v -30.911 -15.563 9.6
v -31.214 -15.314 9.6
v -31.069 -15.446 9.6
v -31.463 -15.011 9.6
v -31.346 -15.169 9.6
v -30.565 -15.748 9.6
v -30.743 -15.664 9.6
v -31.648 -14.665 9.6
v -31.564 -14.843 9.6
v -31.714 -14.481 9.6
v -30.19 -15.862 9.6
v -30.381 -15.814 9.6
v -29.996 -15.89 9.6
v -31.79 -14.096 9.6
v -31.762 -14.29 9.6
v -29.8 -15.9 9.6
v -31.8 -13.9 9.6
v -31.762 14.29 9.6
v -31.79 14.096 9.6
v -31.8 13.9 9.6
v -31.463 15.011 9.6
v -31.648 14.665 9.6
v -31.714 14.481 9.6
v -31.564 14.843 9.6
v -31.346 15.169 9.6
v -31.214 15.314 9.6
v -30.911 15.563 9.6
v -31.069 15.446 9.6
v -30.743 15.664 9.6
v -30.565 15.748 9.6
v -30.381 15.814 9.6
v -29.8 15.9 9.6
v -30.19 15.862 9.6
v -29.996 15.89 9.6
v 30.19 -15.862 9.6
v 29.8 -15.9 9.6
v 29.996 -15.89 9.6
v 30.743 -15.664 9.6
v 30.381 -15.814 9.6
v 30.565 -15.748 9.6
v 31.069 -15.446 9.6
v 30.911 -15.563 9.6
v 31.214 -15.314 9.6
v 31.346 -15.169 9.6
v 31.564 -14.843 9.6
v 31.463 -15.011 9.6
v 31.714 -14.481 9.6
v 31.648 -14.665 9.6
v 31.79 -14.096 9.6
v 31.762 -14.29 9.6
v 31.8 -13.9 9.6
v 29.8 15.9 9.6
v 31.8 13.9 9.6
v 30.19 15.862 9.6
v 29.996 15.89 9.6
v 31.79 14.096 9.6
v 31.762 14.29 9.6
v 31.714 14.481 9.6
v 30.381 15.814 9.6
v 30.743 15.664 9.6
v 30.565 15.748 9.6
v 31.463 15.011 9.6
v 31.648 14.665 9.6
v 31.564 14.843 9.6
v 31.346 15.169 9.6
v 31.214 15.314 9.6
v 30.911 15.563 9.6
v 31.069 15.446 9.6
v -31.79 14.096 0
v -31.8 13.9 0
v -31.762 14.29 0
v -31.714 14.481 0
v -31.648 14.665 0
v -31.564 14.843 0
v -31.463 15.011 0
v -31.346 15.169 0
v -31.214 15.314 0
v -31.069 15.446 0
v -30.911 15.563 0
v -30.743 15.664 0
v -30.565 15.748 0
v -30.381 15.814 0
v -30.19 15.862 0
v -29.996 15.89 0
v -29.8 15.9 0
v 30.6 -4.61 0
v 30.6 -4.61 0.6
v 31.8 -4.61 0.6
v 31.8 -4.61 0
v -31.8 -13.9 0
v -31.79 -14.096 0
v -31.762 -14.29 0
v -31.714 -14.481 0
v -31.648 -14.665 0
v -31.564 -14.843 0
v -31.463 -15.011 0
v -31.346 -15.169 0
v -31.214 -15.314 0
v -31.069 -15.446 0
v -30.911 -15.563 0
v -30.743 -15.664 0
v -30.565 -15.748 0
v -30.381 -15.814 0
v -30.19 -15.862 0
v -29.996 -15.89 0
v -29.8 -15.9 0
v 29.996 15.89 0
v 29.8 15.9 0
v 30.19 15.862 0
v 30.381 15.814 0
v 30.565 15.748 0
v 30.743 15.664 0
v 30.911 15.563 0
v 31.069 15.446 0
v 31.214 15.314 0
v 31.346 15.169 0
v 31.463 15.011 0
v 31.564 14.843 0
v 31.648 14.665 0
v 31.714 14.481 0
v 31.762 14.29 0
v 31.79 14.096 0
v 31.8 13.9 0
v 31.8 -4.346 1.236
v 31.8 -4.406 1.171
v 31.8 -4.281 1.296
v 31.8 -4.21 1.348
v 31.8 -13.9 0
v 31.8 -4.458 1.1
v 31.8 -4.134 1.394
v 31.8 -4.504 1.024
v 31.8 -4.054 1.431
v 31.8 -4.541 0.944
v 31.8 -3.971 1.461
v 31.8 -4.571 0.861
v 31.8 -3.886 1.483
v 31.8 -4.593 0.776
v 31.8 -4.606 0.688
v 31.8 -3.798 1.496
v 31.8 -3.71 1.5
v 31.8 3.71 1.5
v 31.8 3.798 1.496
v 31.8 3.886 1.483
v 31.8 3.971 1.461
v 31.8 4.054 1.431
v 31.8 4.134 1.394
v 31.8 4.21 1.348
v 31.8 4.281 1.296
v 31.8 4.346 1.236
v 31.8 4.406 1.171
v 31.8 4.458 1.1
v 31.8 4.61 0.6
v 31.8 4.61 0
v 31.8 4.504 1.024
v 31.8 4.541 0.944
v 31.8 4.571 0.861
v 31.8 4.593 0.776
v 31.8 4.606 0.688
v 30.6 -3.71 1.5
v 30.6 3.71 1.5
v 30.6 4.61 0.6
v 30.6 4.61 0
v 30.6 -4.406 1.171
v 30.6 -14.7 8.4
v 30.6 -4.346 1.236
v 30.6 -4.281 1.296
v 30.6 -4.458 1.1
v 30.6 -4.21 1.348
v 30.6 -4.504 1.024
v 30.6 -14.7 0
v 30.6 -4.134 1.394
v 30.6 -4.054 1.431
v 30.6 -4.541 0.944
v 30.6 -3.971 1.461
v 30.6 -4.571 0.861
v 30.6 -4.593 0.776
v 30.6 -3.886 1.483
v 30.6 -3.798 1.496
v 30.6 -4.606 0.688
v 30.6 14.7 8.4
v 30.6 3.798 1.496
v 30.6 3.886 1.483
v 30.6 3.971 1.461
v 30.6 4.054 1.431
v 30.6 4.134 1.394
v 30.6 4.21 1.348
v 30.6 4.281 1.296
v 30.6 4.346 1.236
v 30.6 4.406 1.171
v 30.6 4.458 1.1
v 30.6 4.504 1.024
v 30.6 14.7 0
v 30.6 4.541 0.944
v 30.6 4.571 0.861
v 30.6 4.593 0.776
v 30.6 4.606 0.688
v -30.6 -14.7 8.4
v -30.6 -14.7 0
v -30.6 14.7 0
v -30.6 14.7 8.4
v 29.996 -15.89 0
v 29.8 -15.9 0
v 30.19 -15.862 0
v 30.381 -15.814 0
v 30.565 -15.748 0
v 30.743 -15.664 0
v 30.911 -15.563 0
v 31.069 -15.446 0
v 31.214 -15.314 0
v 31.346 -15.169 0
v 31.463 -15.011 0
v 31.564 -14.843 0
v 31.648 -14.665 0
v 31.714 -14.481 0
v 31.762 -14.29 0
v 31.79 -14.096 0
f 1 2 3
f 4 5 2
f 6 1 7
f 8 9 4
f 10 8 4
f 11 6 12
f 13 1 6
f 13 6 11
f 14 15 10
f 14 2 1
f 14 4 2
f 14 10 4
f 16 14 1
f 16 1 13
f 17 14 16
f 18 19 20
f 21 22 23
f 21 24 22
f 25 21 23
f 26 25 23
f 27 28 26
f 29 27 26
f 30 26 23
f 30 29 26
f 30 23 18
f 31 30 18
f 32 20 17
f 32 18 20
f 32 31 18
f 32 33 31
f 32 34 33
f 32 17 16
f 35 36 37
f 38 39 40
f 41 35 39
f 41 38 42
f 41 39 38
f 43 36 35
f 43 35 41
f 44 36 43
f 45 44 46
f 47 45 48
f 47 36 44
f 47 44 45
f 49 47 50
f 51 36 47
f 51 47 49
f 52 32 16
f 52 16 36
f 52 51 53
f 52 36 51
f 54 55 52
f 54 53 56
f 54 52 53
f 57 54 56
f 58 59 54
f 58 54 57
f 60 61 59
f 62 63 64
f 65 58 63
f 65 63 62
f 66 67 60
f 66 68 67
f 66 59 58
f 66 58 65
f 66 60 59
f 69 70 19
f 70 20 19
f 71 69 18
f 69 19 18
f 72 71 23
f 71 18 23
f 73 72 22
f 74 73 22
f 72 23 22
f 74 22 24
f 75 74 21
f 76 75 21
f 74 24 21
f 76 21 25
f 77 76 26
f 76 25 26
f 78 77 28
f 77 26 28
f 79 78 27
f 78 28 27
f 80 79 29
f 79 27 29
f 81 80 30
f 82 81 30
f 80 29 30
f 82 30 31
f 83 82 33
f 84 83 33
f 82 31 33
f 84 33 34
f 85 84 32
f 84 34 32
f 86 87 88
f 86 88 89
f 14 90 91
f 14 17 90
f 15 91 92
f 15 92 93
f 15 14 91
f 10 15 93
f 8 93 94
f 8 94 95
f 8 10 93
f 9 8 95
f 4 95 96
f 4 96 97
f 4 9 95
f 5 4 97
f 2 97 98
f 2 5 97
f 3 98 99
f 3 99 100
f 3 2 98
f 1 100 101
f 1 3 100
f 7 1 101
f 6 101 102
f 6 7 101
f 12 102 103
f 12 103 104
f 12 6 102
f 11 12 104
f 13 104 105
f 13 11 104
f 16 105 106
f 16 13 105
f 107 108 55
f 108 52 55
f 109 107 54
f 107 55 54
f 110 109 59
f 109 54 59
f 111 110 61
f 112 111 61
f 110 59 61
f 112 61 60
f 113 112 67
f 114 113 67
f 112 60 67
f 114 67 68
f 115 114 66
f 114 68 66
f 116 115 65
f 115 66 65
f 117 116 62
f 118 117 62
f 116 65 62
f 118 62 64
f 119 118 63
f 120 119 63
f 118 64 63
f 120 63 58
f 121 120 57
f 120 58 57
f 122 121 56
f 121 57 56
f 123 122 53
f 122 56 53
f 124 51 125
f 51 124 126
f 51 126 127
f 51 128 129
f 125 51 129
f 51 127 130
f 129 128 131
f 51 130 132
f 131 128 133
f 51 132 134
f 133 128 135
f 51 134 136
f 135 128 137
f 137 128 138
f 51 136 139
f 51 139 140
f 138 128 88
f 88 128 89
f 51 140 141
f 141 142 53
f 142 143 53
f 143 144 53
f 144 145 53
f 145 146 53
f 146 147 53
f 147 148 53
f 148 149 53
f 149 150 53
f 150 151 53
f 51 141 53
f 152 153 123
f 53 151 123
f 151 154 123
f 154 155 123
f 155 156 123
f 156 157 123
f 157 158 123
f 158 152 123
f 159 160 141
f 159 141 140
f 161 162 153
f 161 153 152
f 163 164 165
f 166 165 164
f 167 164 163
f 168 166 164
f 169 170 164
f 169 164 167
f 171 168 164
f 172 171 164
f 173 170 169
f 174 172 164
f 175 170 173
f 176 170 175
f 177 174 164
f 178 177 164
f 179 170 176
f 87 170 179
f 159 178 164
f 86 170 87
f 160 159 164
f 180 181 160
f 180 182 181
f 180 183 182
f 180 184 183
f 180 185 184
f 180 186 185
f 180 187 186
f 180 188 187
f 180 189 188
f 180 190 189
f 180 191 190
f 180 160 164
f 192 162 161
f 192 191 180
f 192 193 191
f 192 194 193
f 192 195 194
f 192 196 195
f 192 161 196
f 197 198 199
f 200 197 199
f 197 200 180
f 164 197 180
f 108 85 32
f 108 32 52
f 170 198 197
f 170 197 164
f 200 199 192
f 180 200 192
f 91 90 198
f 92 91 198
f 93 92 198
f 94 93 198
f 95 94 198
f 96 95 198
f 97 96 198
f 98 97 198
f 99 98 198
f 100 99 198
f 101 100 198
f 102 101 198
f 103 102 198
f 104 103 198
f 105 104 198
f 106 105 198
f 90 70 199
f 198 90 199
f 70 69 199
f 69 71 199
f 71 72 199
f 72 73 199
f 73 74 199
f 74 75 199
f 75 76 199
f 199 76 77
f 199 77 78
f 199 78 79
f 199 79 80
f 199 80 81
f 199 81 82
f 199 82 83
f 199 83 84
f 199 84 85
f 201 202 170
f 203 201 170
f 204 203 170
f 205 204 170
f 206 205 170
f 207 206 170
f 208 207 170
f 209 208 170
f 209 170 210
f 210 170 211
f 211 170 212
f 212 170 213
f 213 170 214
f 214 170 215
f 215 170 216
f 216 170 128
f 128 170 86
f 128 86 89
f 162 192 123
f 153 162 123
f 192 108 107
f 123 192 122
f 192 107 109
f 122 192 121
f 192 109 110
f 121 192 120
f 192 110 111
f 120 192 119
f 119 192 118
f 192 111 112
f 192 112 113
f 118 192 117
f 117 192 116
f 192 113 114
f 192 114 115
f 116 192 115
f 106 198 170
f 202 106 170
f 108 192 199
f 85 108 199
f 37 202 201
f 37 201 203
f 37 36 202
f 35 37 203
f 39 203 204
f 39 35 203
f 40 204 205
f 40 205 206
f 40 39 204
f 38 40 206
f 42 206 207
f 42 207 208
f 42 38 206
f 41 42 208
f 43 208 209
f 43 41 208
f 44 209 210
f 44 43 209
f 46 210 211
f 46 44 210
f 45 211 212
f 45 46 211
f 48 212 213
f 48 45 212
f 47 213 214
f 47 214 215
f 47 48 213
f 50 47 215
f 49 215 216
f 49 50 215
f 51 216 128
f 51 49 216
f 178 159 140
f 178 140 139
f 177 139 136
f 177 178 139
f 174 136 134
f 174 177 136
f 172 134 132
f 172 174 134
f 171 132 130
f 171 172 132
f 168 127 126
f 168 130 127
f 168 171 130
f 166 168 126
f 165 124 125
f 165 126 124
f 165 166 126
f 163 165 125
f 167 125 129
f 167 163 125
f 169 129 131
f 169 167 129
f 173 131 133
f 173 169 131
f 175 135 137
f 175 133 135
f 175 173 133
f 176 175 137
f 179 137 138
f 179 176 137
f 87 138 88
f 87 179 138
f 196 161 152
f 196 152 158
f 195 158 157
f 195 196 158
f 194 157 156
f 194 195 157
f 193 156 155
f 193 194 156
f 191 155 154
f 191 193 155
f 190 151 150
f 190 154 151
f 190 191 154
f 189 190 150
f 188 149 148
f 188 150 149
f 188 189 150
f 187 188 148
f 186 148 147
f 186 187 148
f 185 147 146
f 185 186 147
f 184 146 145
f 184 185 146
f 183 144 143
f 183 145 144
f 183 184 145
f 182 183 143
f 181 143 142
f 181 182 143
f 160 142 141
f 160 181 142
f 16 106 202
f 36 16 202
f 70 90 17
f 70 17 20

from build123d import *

# Parameters (mm, degrees)
F0_W     = 63.6
F0_H     = 31.8
F1_DEPTH = 9.6
F2_W     = 61.2
F2_H     = 29.4
F3_DEPTH = 8.4
F4_R     = 2
F6_DEPTH = 32


with BuildPart() as f1:
    # F0 (on Top) → F1 (new body)
    with BuildSketch(Plane.XY):
        Rectangle(F0_W, F0_H)
    extrude(amount=F1_DEPTH)

    # F2 (on Top) → F3 (cut)
    with BuildSketch(Plane.XY):
        Rectangle(F2_W, F2_H)
    extrude(amount=F3_DEPTH, mode=Mode.SUBTRACT)

    # F4
    f4_edges = [f1.edges().sort_by_distance(p)[0] for p in [
        (-31.8, -15.9, 4.8),
        (-31.8, 15.9, 4.8),
        (31.8, 15.9, 4.8),
        (31.8, -15.9, 4.8),
    ]]
    fillet(f4_edges, radius=F4_R)

    # F5 (on Right) → F6 (cut)
    with BuildSketch(Plane.YZ):
        with BuildLine():
            Line((3.71, 1.5), (-3.71, 1.5))
            ThreePointArc((-3.71, 1.5), (-4.346396, 1.236396), (-4.61, 0.6))
            Line((-4.61, 0.6), (-4.61, -0.6))
            ThreePointArc((-4.61, -0.6), (-4.346396, -1.236396), (-3.71, -1.5))
            Line((-3.71, -1.5), (3.71, -1.5))
            ThreePointArc((3.71, -1.5), (4.346396, -1.236396), (4.61, -0.6))
            Line((4.61, -0.6), (4.61, 0.6))
            ThreePointArc((4.61, 0.6), (4.346396, 1.236396), (3.71, 1.5))
        make_face()
    extrude(amount=F6_DEPTH, mode=Mode.SUBTRACT)


solid = f1.part
